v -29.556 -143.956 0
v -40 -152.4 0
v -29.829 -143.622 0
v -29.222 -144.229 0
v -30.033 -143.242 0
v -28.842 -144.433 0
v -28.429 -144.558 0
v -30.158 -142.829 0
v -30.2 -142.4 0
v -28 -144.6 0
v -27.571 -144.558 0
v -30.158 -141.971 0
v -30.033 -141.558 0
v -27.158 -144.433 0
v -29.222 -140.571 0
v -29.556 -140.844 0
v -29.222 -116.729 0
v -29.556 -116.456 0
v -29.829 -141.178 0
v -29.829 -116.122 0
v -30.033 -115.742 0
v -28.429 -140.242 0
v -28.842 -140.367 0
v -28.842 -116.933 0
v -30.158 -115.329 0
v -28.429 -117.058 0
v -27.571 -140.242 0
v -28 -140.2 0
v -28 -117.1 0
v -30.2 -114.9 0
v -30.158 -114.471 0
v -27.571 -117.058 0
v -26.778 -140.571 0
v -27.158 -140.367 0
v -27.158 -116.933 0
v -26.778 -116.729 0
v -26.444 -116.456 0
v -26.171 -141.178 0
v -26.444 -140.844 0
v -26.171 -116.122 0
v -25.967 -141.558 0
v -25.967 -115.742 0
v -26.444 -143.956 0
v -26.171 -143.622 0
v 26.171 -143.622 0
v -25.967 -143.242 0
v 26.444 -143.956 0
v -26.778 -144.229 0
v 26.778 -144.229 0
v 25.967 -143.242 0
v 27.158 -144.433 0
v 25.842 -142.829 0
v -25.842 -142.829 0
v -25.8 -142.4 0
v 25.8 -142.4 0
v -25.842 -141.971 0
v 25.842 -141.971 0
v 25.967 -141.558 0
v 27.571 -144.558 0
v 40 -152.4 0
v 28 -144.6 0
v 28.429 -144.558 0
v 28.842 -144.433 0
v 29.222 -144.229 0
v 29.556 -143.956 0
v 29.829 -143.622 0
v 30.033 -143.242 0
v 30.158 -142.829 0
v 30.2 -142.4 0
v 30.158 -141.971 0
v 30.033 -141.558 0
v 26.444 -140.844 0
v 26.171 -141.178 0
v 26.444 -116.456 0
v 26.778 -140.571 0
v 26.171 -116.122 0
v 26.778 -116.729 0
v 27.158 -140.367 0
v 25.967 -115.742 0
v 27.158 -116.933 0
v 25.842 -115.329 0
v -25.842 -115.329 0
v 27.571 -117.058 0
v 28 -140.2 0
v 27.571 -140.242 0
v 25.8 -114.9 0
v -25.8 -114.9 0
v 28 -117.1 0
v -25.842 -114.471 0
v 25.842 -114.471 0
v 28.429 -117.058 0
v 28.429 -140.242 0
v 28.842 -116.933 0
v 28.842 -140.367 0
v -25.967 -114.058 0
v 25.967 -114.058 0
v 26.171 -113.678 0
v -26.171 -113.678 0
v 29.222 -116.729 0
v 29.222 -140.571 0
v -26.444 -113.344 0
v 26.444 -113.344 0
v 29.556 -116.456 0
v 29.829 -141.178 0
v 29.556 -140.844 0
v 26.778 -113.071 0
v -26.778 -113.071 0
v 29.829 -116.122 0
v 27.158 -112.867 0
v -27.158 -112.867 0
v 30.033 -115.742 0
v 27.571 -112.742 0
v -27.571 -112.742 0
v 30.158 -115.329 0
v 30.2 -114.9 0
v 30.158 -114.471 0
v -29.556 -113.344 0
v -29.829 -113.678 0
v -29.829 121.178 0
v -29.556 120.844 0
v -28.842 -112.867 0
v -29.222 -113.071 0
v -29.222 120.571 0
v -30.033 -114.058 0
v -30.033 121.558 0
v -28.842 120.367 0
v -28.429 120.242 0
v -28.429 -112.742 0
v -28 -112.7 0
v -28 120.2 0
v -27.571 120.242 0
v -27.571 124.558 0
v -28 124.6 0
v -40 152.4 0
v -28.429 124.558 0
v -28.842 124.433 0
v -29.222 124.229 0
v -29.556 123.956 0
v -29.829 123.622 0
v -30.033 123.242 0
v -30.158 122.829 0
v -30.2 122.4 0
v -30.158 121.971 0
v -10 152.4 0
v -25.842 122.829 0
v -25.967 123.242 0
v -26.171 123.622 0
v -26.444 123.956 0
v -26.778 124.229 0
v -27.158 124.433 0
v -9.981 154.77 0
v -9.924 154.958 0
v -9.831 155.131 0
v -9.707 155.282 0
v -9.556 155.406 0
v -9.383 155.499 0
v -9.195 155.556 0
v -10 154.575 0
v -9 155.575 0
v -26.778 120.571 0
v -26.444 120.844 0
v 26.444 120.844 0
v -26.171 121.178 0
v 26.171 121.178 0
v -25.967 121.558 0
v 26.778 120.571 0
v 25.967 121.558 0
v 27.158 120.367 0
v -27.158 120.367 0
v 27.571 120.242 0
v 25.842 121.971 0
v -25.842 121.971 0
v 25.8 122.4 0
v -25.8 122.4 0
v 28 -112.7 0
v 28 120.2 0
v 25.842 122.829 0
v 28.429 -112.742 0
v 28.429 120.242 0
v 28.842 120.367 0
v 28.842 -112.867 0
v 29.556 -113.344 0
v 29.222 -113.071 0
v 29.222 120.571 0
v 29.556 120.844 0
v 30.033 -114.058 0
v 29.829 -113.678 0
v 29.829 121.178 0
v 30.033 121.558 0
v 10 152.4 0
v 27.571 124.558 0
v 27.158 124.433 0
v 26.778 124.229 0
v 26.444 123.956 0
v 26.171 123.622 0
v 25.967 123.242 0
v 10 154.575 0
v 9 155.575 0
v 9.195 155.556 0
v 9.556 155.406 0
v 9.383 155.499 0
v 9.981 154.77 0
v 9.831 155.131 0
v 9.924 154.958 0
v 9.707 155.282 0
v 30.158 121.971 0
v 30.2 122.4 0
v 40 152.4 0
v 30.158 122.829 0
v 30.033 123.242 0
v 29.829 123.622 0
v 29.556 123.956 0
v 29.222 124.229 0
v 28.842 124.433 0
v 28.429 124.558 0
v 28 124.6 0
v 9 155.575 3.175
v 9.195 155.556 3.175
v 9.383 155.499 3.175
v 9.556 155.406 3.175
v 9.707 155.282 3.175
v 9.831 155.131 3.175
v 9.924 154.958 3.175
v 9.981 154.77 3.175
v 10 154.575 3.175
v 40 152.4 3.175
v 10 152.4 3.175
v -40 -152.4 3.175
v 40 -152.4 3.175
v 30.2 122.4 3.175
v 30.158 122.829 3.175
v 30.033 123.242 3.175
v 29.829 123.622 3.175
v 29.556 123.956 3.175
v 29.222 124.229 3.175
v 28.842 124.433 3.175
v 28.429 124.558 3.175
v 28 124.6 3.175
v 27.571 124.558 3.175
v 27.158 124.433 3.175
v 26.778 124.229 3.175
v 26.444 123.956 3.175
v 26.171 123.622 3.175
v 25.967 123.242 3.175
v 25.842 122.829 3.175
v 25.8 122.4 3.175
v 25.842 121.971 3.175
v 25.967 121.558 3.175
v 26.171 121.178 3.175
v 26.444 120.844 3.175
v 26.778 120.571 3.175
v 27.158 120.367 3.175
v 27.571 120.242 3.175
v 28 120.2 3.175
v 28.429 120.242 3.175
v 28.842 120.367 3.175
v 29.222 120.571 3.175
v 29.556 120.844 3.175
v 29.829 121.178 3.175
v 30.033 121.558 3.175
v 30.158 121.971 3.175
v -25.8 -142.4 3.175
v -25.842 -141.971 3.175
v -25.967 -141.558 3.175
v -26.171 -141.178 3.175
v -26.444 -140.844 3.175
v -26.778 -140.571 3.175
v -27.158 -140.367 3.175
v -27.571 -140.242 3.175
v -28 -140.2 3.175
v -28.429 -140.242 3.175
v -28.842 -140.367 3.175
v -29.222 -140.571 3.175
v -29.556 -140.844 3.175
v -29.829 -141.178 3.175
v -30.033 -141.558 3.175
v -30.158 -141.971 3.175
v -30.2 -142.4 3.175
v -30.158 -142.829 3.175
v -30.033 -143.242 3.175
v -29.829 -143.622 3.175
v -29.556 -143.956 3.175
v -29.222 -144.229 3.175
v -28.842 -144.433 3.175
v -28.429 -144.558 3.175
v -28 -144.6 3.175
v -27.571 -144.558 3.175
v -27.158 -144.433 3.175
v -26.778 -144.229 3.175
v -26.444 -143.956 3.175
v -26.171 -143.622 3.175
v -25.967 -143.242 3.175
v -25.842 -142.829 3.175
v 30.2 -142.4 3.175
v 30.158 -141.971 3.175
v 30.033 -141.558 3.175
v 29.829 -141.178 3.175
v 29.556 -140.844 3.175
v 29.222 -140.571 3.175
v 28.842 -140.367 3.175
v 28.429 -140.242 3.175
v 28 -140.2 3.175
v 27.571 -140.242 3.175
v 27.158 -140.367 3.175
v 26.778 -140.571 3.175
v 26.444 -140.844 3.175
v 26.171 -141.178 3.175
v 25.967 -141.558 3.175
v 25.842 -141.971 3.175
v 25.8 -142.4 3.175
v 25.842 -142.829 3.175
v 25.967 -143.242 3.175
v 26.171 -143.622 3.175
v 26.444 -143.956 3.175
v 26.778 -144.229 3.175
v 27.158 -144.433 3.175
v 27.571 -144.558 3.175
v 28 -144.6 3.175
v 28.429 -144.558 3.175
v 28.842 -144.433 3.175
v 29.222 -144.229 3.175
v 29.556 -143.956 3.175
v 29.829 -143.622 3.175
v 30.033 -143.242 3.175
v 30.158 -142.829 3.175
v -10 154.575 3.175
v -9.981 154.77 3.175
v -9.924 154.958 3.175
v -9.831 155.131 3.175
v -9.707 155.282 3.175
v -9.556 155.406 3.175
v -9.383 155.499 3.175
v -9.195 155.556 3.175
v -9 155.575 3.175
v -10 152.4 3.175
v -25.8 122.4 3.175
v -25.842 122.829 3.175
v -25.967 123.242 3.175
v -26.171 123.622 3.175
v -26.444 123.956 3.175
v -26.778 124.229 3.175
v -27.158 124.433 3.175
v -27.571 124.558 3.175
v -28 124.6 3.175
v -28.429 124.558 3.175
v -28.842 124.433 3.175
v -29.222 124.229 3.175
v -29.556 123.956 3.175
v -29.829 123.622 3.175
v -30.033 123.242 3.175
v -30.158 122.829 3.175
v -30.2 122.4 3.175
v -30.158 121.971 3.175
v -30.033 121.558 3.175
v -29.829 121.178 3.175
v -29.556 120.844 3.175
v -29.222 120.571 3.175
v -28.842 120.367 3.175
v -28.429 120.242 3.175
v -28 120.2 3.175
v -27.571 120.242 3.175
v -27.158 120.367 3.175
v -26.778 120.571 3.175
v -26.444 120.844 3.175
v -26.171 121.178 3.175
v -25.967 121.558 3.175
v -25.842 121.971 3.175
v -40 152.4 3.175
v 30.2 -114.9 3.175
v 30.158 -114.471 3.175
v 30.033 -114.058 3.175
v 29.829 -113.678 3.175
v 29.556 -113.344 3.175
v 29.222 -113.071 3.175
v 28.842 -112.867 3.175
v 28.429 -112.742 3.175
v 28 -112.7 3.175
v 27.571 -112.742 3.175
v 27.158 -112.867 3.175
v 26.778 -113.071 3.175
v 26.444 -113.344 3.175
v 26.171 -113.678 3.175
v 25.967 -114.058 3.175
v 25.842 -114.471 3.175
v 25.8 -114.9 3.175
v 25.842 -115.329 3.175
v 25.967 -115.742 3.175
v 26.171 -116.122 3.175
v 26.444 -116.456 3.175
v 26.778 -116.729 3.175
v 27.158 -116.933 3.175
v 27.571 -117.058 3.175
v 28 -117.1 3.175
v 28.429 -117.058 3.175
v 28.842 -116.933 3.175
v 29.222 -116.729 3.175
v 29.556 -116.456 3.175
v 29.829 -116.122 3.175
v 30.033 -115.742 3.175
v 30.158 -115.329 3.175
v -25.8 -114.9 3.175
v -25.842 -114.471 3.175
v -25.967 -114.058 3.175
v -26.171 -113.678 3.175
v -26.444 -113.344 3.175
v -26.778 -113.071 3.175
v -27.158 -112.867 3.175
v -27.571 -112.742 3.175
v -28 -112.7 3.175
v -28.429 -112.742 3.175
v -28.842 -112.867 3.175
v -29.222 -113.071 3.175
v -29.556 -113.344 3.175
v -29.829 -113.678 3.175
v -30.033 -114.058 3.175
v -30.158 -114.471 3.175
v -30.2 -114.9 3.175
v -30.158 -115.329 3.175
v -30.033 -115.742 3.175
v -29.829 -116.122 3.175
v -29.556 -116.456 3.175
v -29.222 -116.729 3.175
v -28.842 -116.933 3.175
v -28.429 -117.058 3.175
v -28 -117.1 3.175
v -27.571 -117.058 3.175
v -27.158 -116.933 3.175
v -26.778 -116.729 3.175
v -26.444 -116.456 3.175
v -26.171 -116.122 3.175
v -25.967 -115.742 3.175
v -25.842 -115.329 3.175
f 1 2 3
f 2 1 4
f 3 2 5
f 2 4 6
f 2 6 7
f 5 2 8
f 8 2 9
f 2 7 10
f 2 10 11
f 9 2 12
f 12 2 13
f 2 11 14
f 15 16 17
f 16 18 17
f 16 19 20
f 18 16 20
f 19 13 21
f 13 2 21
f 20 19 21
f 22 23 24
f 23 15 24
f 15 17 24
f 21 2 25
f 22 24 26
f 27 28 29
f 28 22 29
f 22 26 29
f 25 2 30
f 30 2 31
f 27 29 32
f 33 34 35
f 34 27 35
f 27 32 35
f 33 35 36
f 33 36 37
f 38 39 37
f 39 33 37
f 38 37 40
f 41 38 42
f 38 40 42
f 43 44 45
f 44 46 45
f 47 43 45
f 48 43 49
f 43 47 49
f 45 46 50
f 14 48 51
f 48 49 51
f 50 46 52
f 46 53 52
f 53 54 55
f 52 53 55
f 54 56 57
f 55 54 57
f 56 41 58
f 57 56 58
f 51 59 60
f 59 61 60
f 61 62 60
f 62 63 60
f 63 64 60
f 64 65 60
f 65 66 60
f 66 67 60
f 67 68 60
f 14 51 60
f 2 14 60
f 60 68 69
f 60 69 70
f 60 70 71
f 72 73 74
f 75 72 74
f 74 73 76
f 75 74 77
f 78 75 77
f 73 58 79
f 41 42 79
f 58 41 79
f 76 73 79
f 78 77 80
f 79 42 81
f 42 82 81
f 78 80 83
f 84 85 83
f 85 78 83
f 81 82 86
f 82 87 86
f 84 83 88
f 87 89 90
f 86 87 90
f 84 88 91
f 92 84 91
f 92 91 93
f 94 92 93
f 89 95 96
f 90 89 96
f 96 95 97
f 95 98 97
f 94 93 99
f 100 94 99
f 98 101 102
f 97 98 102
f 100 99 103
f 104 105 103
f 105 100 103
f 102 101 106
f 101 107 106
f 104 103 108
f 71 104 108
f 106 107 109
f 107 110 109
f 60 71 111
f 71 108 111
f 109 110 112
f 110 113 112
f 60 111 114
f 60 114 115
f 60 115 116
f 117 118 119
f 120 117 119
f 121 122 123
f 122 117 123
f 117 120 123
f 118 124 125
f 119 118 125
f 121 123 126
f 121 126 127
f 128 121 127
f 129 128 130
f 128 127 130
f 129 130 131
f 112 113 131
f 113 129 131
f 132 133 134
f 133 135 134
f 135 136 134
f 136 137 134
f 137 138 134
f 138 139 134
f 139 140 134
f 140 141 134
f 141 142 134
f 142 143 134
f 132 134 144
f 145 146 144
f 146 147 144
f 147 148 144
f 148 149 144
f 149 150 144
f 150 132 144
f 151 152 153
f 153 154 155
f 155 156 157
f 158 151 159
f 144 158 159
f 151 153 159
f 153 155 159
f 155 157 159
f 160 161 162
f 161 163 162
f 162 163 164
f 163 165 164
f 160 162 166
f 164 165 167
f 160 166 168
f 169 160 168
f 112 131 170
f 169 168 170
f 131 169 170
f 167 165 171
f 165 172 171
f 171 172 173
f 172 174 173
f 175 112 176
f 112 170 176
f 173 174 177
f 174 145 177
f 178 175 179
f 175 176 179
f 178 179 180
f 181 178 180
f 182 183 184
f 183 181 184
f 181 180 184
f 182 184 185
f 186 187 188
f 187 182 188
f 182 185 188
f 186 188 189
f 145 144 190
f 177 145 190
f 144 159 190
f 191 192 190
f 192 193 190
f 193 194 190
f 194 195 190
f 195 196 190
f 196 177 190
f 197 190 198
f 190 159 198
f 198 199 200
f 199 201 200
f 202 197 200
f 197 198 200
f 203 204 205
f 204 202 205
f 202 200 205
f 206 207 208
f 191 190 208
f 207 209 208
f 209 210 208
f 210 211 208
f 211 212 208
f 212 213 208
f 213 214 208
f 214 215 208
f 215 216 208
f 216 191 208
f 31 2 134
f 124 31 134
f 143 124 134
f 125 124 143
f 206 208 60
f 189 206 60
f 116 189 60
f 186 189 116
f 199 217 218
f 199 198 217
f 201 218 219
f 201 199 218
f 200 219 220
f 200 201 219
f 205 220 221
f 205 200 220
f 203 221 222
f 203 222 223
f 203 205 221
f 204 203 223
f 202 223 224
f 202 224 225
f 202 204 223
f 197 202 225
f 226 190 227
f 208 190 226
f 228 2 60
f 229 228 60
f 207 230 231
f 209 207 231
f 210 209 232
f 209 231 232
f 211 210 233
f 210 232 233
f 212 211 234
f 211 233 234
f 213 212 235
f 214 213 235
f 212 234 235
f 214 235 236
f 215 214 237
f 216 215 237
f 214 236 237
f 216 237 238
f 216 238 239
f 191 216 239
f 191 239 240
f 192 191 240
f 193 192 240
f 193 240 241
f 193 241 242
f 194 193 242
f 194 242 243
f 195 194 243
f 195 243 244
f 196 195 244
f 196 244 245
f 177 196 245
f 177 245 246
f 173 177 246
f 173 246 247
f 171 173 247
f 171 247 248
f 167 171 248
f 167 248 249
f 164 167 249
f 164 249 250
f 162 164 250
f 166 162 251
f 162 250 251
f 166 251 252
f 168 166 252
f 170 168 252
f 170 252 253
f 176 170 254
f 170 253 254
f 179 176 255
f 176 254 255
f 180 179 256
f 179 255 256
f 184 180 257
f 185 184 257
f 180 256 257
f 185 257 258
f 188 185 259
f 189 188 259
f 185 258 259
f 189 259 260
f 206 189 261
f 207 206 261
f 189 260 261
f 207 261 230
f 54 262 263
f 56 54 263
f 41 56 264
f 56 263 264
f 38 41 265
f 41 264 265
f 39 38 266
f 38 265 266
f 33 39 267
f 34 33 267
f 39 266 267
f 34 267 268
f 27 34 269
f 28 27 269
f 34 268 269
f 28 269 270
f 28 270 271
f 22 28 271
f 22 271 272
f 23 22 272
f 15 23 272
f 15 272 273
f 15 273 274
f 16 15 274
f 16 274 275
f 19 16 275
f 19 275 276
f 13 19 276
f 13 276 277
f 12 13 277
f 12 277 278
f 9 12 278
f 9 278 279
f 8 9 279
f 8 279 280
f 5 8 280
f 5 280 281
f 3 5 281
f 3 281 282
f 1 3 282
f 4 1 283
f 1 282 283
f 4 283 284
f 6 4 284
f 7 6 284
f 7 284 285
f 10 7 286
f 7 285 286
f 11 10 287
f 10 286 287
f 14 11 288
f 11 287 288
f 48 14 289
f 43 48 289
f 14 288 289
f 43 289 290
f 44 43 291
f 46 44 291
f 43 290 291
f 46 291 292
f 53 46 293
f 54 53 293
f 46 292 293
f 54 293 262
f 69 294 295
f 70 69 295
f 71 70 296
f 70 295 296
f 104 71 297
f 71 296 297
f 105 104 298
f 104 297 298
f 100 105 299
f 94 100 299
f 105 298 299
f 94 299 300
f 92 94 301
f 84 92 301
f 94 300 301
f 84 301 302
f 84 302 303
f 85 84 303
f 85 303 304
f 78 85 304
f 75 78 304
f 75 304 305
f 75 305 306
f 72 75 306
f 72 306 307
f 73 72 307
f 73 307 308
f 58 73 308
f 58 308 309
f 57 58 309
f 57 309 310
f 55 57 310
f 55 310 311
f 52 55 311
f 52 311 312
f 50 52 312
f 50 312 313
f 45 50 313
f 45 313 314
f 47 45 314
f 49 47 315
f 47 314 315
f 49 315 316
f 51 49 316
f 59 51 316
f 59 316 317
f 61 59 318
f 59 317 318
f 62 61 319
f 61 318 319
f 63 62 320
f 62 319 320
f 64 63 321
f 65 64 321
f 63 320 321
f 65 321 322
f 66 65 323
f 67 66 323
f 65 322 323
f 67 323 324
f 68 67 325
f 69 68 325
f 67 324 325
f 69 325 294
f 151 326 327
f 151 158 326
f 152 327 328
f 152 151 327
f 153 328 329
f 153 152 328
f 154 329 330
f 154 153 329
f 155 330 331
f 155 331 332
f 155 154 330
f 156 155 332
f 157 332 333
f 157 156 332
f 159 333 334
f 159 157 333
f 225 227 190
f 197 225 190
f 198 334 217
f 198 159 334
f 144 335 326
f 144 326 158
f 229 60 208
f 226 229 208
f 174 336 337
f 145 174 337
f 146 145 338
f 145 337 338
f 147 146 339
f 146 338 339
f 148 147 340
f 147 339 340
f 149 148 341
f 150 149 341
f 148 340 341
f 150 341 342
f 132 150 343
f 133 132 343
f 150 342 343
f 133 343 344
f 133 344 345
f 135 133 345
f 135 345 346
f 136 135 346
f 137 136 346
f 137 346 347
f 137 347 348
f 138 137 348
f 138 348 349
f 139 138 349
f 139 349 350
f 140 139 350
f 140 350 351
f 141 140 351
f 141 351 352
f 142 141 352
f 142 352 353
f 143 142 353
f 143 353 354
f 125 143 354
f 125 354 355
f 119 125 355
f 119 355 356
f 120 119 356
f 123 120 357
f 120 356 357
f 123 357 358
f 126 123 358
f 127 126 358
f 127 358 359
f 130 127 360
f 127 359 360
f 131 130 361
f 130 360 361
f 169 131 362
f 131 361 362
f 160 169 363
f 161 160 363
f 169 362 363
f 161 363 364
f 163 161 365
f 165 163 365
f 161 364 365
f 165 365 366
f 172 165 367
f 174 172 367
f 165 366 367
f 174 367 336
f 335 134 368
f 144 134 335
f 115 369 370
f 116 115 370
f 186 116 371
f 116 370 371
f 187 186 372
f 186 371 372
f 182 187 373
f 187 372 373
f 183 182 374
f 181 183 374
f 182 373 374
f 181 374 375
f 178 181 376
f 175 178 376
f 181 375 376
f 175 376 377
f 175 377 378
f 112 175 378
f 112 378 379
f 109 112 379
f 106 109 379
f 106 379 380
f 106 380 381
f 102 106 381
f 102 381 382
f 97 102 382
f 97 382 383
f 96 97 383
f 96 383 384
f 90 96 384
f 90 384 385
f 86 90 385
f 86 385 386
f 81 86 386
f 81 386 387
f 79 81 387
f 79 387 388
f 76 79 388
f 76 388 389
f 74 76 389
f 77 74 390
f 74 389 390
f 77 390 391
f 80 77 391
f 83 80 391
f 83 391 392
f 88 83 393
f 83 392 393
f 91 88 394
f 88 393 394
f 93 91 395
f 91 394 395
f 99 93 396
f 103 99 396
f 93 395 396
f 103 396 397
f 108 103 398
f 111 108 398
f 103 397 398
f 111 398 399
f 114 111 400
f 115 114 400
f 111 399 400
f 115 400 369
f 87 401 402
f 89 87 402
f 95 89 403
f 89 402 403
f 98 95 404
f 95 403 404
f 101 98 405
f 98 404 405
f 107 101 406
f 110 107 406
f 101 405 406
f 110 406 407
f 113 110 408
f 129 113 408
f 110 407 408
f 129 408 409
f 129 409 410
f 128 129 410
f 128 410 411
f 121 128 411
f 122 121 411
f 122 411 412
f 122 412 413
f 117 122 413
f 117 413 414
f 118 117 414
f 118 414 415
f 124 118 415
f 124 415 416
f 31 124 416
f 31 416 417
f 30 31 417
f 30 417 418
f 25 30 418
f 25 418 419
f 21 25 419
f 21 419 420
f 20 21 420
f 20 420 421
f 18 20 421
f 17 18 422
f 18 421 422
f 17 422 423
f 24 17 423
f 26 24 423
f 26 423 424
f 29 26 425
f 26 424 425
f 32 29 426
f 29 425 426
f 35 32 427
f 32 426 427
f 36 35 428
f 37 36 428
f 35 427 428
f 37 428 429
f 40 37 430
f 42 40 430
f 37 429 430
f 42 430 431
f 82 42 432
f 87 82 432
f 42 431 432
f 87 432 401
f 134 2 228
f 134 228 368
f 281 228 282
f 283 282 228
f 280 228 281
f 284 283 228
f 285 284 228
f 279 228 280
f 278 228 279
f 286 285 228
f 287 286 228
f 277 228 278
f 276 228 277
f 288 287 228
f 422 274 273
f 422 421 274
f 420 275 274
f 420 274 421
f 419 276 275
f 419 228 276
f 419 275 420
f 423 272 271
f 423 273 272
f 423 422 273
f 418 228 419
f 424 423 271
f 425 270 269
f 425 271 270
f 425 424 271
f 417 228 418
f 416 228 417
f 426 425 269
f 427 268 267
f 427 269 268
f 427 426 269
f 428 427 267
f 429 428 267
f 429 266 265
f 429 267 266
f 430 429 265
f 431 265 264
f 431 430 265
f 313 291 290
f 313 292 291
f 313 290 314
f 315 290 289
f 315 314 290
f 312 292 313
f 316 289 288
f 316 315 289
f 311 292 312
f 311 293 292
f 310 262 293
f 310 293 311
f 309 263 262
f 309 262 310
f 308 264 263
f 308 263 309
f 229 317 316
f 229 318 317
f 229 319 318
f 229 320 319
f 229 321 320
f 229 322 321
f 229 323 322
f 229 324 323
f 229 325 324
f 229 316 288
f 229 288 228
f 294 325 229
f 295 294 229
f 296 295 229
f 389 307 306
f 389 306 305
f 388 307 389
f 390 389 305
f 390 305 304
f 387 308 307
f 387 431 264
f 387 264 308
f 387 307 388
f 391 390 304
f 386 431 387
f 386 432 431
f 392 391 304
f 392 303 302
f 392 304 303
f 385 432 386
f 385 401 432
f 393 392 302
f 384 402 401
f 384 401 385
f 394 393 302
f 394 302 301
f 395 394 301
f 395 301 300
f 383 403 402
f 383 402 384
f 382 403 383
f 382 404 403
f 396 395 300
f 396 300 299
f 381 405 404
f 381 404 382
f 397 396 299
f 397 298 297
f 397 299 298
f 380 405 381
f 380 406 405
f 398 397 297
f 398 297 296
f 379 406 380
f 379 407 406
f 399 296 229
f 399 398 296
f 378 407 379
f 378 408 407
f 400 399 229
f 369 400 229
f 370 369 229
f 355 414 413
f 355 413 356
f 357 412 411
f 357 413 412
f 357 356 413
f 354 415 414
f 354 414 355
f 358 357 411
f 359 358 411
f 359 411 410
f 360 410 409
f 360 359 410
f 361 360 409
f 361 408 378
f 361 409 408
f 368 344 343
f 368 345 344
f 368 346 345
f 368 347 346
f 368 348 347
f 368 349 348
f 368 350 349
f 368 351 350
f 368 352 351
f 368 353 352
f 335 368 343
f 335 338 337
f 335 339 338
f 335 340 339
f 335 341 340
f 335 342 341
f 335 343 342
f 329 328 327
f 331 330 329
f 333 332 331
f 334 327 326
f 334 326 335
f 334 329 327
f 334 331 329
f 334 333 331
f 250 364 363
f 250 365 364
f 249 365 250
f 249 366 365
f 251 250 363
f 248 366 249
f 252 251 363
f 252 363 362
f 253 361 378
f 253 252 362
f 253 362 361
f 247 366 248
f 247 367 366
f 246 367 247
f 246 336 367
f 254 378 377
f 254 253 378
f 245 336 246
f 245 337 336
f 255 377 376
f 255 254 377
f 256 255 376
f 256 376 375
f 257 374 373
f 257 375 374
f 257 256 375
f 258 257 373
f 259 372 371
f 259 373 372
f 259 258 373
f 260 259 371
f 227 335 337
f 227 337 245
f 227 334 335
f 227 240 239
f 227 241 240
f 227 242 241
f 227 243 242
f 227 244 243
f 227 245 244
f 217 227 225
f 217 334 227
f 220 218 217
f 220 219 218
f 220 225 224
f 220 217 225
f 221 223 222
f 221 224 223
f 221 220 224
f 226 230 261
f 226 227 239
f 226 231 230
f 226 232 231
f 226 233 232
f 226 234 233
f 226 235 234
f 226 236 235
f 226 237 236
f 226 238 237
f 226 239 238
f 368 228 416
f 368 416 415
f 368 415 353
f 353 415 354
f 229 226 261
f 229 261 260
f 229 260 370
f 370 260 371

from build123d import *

# Parameters (mm, degrees)
SKETCH1_W           = 80
SKETCH1_H           = 304.8
BOSS_EXTRUDE1_DEPTH = 3.175
SKETCH2_R           = 2.2
CUT_EXTRUDE1_DEPTH  = 4.175
SKETCH3_W           = 20
SKETCH3_H           = 3.175
BOSS_EXTRUDE2_DEPTH = 3.175
FILLET1_R           = 1


with BuildPart() as part:
    # Sketch1 → Boss-Extrude1 (new body)
    with BuildSketch(Plane.XY):
        Rectangle(SKETCH1_W, SKETCH1_H)
    extrude(amount=BOSS_EXTRUDE1_DEPTH)

    # Sketch2 → Cut-Extrude1 (cut, through all)
    with BuildSketch(Plane.XY.offset(3.175)):
        with Locations((-28, -114.9)):
            Circle(SKETCH2_R)
        with Locations((28, -114.9)):
            Circle(SKETCH2_R)
        with Locations((28, -142.4)):
            Circle(SKETCH2_R)
        with Locations((-28, -142.4)):
            Circle(SKETCH2_R)
        with Locations((-28, 122.4)):
            Circle(SKETCH2_R)
        with Locations((28, 122.4)):
            Circle(SKETCH2_R)
    extrude(amount=-CUT_EXTRUDE1_DEPTH, mode=Mode.SUBTRACT)

    # Sketch3 → Boss-Extrude2 (add)
    with BuildSketch(Plane(origin=(0, 152.4, 0), x_dir=(1, 0, 0), z_dir=(0, 1, 0))):
        with Locations((0, -1.5875)):
            Rectangle(SKETCH3_W, SKETCH3_H)
    extrude(amount=BOSS_EXTRUDE2_DEPTH)

    # Fillet1
    fillet1_edges = [part.edges().sort_by_distance(p)[0] for p in [
        (10, 155.575, 1.5875),
        (-10, 155.575, 1.5875),
    ]]
    fillet(fillet1_edges, radius=FILLET1_R)


solid = part.part
